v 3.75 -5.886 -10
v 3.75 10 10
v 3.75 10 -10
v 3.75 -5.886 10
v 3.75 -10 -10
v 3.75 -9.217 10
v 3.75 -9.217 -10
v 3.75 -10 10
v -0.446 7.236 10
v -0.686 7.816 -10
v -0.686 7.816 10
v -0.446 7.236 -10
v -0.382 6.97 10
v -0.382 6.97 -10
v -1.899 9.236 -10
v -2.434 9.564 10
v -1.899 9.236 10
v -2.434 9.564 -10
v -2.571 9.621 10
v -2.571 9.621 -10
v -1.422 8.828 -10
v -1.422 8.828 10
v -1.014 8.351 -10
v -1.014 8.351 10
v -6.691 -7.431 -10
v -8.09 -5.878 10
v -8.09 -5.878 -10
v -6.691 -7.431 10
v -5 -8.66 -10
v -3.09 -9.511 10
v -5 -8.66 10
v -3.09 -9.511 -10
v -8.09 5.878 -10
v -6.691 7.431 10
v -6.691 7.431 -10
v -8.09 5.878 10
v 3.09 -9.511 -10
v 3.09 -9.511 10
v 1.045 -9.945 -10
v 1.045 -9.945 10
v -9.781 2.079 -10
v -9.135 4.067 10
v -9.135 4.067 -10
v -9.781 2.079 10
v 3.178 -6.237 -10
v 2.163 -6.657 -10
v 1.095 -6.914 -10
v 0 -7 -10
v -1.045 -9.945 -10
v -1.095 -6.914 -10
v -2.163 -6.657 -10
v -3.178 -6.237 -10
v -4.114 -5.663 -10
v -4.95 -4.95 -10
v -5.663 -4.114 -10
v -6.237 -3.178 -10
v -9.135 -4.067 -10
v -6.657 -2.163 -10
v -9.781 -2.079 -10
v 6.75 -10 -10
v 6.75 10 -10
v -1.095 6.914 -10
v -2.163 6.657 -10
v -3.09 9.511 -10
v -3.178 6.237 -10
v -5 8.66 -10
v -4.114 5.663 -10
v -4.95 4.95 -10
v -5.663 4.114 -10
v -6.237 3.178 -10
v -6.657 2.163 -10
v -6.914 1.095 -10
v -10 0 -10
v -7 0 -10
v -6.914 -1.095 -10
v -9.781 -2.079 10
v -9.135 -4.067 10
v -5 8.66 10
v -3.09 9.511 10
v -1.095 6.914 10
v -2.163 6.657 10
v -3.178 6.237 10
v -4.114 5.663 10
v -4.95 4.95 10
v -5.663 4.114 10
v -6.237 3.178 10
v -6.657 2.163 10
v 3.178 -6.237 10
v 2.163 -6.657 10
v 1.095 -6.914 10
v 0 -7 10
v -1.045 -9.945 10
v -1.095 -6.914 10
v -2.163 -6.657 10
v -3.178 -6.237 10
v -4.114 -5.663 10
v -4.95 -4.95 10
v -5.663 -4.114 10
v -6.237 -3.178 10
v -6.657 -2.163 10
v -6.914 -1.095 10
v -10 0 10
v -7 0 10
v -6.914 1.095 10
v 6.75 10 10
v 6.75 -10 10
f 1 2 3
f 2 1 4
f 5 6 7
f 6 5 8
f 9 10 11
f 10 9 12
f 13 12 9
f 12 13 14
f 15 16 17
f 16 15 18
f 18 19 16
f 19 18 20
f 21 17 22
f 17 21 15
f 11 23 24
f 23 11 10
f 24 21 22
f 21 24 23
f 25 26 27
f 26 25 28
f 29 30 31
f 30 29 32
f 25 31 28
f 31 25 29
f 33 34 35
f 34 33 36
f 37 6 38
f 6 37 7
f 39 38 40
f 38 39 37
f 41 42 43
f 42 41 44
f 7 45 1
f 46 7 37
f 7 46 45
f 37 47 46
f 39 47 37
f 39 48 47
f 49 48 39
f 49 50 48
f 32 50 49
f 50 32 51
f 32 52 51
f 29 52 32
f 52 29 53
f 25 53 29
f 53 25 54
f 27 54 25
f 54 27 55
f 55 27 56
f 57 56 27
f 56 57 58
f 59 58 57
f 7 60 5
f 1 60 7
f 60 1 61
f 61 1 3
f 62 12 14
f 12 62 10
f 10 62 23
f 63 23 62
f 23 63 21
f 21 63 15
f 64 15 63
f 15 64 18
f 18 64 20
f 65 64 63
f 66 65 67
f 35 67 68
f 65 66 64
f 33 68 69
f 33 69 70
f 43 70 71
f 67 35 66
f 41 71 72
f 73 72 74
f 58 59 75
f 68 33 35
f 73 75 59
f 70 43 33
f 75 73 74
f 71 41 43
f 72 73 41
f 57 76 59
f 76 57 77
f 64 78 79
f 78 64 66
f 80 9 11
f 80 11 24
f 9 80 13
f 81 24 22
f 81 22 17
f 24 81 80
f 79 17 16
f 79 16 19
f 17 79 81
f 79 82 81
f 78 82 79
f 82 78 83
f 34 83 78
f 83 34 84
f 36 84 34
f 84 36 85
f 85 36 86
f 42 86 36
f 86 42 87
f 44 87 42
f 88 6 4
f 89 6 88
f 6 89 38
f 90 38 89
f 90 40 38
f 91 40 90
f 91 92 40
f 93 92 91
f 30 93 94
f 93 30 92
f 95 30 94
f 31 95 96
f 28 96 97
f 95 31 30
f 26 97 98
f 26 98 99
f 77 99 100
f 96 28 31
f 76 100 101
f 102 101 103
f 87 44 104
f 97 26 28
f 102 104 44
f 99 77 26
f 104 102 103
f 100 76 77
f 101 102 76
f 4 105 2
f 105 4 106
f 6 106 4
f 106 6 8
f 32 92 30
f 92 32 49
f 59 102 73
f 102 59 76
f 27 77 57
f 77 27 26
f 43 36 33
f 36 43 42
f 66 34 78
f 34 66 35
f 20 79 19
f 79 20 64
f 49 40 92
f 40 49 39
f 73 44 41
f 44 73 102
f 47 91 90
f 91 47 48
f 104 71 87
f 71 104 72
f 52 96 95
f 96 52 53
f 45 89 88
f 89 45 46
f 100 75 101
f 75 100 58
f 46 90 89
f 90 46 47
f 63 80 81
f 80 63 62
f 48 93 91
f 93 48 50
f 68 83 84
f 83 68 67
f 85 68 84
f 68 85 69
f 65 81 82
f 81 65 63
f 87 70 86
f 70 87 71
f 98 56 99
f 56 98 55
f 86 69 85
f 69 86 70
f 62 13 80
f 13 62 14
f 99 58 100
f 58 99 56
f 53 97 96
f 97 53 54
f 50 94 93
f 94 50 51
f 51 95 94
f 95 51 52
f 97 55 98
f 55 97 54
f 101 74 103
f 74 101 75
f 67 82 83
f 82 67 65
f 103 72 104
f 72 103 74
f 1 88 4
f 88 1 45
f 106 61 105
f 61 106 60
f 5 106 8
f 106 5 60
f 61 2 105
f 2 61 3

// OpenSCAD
s = 20;  // side length
th = 3;  // wall thickness

// wire diameter size (size of clip notch, not inner radius)
wd = 3/16*s +th;  // suggested wire diameter (size of the clip notch).
wd = 8;
/* wd = s-2*th; // max wire diameter (size of clip notch) */


module _cutout() {
  difference() {
    cube([wd, s+1, s+1], center=true);
    #hull() {
    translate([-wd/2, -wd/2 , 0])cylinder(r=wd/2, h=s+2, center=true, $fn=40);
    translate([-wd/2, -s/2-th/2, 0]) cylinder(r=.1, h=s+2, center=true);
    }
  }
}


module cable_clip() {  // make me
  translate([(s*3/8+th)/2, 0, 0]) rotate([0, 90, 0])
    cube([s, s, th], center=true);

  difference() {
    cylinder(r=s/2, h=s, center=true);
    cylinder(r=s/2 - th, h=s+1, center=true, $fn=40);
    // cutout excess cylinder
    translate([(s*3/8)/2 + s/2 + th, 0, 0])cube([s, s, s+1], center=true);
    // cutout space to insert wire into clip with rounded edge
    translate([(s*3/8)/2 - wd/2, s/2,0]) _cutout();
  }
}
cable_clip();
